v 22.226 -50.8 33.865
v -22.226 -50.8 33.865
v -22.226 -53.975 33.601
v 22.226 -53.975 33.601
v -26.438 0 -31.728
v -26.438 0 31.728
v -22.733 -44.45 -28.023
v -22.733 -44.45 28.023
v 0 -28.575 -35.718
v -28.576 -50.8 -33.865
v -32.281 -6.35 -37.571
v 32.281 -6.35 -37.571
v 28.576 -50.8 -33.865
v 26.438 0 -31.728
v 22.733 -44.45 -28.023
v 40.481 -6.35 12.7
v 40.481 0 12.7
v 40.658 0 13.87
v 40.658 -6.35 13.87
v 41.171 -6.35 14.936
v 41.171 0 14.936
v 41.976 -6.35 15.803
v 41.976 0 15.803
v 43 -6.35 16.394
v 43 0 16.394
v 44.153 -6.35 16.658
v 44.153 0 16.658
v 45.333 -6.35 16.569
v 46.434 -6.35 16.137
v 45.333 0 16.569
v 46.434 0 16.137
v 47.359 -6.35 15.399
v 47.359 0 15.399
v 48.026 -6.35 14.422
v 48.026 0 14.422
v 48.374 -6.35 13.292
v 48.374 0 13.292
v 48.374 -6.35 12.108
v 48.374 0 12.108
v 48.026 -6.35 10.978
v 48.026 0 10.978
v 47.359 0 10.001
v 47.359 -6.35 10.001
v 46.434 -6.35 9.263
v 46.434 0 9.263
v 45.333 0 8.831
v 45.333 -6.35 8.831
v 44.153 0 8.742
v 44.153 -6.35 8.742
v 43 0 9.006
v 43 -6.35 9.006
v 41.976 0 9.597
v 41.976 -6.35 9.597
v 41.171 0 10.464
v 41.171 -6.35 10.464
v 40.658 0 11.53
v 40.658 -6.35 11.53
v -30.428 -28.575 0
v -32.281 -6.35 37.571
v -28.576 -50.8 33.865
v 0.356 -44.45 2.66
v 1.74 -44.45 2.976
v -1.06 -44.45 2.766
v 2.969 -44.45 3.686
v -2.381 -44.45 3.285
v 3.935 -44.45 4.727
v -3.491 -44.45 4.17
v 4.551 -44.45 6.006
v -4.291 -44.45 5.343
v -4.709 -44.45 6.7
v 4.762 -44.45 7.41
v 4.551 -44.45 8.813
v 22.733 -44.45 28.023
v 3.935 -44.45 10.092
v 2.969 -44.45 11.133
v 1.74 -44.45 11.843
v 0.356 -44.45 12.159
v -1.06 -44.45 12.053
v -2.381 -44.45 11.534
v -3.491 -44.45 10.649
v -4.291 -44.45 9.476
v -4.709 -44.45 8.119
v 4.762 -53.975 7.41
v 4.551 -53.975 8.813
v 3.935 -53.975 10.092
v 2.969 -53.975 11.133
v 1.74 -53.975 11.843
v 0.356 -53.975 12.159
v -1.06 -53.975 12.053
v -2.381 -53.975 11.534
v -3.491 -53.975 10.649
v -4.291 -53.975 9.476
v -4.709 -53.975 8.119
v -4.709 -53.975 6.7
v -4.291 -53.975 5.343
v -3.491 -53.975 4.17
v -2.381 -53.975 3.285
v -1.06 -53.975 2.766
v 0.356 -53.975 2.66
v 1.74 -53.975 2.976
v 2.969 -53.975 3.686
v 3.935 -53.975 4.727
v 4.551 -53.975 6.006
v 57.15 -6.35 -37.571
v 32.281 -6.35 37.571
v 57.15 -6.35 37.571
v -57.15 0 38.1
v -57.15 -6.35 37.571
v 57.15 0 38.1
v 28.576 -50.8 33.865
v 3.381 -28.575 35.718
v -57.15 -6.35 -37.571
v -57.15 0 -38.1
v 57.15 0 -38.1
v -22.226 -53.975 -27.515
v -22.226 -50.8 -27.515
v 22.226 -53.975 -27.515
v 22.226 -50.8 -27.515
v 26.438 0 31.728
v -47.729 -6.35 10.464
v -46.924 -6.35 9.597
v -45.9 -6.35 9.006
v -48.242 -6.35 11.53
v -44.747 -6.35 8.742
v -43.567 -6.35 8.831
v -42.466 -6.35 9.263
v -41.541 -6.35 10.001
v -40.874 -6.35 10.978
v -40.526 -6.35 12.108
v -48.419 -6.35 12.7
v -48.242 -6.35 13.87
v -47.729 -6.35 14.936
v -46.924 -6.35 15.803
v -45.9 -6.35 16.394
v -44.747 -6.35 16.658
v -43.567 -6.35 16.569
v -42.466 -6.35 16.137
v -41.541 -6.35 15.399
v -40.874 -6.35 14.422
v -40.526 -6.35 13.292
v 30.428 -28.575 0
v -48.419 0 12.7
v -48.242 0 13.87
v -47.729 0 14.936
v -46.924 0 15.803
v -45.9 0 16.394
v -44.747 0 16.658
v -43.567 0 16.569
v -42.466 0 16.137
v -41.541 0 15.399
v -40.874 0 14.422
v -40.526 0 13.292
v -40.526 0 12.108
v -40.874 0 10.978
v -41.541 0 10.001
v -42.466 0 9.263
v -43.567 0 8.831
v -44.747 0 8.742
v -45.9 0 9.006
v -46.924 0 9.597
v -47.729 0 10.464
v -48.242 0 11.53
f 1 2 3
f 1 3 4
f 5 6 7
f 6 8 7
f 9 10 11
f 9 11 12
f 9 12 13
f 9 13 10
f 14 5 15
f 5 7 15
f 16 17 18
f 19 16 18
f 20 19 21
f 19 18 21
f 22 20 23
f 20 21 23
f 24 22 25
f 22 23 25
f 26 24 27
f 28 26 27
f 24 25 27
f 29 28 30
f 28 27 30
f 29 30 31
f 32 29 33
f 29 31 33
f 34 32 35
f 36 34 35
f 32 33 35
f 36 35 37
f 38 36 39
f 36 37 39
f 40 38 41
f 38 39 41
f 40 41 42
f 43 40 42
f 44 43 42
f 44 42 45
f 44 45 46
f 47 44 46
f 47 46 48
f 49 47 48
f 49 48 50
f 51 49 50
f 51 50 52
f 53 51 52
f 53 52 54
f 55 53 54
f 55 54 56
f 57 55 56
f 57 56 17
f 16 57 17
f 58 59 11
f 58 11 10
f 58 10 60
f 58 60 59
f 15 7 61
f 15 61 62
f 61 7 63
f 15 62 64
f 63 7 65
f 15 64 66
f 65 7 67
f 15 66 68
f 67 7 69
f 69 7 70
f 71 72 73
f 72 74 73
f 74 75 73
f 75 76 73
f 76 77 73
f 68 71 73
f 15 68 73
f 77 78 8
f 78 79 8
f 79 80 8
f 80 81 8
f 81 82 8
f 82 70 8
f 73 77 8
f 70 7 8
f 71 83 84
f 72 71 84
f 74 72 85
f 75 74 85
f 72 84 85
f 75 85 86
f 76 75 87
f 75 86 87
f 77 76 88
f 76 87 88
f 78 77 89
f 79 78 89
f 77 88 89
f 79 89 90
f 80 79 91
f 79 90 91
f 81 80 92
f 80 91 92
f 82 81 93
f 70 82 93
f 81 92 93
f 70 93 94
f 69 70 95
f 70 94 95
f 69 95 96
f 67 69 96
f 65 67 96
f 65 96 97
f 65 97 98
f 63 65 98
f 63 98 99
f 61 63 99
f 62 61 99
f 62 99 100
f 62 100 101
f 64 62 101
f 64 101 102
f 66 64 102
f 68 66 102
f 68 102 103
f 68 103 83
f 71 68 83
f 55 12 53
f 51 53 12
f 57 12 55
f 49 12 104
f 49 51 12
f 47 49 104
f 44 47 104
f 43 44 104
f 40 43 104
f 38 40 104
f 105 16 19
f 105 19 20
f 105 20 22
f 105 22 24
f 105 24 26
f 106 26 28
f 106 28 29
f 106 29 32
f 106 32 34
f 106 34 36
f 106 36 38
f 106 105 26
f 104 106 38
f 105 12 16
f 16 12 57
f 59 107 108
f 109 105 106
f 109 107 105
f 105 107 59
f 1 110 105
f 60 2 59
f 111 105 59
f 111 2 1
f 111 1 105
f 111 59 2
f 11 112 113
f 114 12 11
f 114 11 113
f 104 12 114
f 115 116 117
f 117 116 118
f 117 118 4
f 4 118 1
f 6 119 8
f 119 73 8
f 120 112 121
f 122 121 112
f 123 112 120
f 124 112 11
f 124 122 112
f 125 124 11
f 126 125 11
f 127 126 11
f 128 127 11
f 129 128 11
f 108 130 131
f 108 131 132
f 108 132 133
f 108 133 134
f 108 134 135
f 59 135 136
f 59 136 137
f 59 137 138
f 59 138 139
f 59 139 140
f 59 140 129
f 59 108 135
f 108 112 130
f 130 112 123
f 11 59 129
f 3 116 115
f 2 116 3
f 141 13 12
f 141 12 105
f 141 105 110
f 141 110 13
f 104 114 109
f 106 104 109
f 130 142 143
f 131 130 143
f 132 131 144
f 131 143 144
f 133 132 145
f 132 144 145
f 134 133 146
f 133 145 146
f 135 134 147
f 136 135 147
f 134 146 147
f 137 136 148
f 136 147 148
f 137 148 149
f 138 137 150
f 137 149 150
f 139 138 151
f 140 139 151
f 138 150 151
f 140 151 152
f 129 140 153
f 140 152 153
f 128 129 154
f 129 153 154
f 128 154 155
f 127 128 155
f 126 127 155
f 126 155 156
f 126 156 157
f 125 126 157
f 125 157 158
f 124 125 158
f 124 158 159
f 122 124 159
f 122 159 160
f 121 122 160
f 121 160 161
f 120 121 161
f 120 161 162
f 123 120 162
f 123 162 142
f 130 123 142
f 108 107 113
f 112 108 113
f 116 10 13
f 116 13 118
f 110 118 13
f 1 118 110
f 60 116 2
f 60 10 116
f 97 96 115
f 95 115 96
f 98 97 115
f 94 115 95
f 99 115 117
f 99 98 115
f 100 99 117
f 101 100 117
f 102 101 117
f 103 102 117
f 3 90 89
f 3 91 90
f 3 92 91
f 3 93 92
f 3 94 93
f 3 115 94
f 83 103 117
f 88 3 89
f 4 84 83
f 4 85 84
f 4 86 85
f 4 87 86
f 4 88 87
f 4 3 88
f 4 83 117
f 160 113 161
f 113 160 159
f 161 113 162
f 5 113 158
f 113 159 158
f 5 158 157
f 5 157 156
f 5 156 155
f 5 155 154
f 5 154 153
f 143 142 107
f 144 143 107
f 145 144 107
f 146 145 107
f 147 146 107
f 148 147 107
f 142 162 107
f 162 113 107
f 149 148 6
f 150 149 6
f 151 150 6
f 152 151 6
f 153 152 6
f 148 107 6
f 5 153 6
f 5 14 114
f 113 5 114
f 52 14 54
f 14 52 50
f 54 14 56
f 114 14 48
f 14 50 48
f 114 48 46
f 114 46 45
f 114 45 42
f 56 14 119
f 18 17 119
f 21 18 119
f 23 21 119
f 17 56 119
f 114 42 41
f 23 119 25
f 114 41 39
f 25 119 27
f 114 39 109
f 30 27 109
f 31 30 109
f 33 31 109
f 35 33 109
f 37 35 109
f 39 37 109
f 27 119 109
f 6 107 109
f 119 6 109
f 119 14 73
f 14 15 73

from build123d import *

# Parameters (mm, degrees)
F0_W      = 65.620646
F0_H      = 76.2
F1_DEPTH  = 50.8
F1_TAPER  = 4.765
F2_T      = -6.35
F3_W      = 44.4515540981
F3_H      = 61.380908036
F4_DEPTH  = 3.175
F5_W      = 52.8765998903
F5_H      = 63.4559538903
F6_DEPTH  = 6.35
F7_R      = 127
F8_DEPTH  = 4.4846550372
F9_R      = 114.3
F10_DEPTH = 4.4846550455
F11_R     = 3.96875
F12_DEPTH = 53.9760001
F13_R     = 4.7625
F14_DEPTH = 53.9760001


with BuildPart() as f1:
    # F0 (on Front) → F1 (new body)
    with BuildSketch(Plane.XZ):
        Rectangle(F0_W, F0_H)
    extrude(amount=F1_DEPTH, taper=F1_TAPER)

    # F2
    f2_openings = [f1.faces().sort_by_distance(p)[0] for p in [
        (0, 0, 0),
    ]]
    offset(amount=F2_T, openings=f2_openings)

    # F3 (on face) → F4 (join)
    with BuildSketch(Plane.XZ.offset(50.8)):
        with Locations((0, 3.174999969)):
            Rectangle(F3_W, F3_H)
    extrude(amount=F4_DEPTH)

    # F5 (on Front) → F6 (join)
    with BuildSketch(Plane.XZ):
        Polygon((-32.810323, -38.1), (32.810323, -38.1), (57.15, -38.1), (57.15, 38.1), (32.810323, 38.1), (-32.810323, 38.1), (-57.15, 38.1), (-57.15, -38.1), align=None)
        Rectangle(F5_W, F5_H, mode=Mode.SUBTRACT)
    extrude(amount=F6_DEPTH)

    # F7 (on face) → F8 (cut, through all)
    with BuildSketch(Plane(origin=(0, -3.1539942218, 37.8370918571), x_dir=(1, 0, 0), z_dir=(0, -0.0830691049, 0.9965437892))):
        with Locations((28.5757769869, -47.8112515417)):
            Circle(F7_R)
    extrude(amount=F8_DEPTH, mode=Mode.SUBTRACT)

    # F9 (on face) → F10 (cut, through all)
    with BuildSketch(Plane(origin=(0, -3.1539942218, -37.8370918571), x_dir=(1, 0, 0), z_dir=(0, -0.0830691049, -0.9965437892))):
        with Locations((-28.5757769869, 47.8112515417)):
            Circle(F9_R)
    extrude(amount=F10_DEPTH, mode=Mode.SUBTRACT)

    # F11 (on face) → F12 (cut, through all)
    with BuildSketch(Plane(origin=(0, 0, 0), x_dir=(-1, 0, 0), z_dir=(0, 1, 0))):
        with Locations((-44.45, 12.7)):
            Circle(F11_R)
        with Locations((44.45, 12.7)):
            Circle(F11_R)
    extrude(amount=-F12_DEPTH, mode=Mode.SUBTRACT)

    # F13 (on face) → F14 (cut, through all)
    with BuildSketch(Plane.XZ.offset(53.975)):
        with Locations((0, 7.4095460131)):
            Circle(F13_R)
    extrude(amount=-F14_DEPTH, mode=Mode.SUBTRACT)


solid = f1.part
